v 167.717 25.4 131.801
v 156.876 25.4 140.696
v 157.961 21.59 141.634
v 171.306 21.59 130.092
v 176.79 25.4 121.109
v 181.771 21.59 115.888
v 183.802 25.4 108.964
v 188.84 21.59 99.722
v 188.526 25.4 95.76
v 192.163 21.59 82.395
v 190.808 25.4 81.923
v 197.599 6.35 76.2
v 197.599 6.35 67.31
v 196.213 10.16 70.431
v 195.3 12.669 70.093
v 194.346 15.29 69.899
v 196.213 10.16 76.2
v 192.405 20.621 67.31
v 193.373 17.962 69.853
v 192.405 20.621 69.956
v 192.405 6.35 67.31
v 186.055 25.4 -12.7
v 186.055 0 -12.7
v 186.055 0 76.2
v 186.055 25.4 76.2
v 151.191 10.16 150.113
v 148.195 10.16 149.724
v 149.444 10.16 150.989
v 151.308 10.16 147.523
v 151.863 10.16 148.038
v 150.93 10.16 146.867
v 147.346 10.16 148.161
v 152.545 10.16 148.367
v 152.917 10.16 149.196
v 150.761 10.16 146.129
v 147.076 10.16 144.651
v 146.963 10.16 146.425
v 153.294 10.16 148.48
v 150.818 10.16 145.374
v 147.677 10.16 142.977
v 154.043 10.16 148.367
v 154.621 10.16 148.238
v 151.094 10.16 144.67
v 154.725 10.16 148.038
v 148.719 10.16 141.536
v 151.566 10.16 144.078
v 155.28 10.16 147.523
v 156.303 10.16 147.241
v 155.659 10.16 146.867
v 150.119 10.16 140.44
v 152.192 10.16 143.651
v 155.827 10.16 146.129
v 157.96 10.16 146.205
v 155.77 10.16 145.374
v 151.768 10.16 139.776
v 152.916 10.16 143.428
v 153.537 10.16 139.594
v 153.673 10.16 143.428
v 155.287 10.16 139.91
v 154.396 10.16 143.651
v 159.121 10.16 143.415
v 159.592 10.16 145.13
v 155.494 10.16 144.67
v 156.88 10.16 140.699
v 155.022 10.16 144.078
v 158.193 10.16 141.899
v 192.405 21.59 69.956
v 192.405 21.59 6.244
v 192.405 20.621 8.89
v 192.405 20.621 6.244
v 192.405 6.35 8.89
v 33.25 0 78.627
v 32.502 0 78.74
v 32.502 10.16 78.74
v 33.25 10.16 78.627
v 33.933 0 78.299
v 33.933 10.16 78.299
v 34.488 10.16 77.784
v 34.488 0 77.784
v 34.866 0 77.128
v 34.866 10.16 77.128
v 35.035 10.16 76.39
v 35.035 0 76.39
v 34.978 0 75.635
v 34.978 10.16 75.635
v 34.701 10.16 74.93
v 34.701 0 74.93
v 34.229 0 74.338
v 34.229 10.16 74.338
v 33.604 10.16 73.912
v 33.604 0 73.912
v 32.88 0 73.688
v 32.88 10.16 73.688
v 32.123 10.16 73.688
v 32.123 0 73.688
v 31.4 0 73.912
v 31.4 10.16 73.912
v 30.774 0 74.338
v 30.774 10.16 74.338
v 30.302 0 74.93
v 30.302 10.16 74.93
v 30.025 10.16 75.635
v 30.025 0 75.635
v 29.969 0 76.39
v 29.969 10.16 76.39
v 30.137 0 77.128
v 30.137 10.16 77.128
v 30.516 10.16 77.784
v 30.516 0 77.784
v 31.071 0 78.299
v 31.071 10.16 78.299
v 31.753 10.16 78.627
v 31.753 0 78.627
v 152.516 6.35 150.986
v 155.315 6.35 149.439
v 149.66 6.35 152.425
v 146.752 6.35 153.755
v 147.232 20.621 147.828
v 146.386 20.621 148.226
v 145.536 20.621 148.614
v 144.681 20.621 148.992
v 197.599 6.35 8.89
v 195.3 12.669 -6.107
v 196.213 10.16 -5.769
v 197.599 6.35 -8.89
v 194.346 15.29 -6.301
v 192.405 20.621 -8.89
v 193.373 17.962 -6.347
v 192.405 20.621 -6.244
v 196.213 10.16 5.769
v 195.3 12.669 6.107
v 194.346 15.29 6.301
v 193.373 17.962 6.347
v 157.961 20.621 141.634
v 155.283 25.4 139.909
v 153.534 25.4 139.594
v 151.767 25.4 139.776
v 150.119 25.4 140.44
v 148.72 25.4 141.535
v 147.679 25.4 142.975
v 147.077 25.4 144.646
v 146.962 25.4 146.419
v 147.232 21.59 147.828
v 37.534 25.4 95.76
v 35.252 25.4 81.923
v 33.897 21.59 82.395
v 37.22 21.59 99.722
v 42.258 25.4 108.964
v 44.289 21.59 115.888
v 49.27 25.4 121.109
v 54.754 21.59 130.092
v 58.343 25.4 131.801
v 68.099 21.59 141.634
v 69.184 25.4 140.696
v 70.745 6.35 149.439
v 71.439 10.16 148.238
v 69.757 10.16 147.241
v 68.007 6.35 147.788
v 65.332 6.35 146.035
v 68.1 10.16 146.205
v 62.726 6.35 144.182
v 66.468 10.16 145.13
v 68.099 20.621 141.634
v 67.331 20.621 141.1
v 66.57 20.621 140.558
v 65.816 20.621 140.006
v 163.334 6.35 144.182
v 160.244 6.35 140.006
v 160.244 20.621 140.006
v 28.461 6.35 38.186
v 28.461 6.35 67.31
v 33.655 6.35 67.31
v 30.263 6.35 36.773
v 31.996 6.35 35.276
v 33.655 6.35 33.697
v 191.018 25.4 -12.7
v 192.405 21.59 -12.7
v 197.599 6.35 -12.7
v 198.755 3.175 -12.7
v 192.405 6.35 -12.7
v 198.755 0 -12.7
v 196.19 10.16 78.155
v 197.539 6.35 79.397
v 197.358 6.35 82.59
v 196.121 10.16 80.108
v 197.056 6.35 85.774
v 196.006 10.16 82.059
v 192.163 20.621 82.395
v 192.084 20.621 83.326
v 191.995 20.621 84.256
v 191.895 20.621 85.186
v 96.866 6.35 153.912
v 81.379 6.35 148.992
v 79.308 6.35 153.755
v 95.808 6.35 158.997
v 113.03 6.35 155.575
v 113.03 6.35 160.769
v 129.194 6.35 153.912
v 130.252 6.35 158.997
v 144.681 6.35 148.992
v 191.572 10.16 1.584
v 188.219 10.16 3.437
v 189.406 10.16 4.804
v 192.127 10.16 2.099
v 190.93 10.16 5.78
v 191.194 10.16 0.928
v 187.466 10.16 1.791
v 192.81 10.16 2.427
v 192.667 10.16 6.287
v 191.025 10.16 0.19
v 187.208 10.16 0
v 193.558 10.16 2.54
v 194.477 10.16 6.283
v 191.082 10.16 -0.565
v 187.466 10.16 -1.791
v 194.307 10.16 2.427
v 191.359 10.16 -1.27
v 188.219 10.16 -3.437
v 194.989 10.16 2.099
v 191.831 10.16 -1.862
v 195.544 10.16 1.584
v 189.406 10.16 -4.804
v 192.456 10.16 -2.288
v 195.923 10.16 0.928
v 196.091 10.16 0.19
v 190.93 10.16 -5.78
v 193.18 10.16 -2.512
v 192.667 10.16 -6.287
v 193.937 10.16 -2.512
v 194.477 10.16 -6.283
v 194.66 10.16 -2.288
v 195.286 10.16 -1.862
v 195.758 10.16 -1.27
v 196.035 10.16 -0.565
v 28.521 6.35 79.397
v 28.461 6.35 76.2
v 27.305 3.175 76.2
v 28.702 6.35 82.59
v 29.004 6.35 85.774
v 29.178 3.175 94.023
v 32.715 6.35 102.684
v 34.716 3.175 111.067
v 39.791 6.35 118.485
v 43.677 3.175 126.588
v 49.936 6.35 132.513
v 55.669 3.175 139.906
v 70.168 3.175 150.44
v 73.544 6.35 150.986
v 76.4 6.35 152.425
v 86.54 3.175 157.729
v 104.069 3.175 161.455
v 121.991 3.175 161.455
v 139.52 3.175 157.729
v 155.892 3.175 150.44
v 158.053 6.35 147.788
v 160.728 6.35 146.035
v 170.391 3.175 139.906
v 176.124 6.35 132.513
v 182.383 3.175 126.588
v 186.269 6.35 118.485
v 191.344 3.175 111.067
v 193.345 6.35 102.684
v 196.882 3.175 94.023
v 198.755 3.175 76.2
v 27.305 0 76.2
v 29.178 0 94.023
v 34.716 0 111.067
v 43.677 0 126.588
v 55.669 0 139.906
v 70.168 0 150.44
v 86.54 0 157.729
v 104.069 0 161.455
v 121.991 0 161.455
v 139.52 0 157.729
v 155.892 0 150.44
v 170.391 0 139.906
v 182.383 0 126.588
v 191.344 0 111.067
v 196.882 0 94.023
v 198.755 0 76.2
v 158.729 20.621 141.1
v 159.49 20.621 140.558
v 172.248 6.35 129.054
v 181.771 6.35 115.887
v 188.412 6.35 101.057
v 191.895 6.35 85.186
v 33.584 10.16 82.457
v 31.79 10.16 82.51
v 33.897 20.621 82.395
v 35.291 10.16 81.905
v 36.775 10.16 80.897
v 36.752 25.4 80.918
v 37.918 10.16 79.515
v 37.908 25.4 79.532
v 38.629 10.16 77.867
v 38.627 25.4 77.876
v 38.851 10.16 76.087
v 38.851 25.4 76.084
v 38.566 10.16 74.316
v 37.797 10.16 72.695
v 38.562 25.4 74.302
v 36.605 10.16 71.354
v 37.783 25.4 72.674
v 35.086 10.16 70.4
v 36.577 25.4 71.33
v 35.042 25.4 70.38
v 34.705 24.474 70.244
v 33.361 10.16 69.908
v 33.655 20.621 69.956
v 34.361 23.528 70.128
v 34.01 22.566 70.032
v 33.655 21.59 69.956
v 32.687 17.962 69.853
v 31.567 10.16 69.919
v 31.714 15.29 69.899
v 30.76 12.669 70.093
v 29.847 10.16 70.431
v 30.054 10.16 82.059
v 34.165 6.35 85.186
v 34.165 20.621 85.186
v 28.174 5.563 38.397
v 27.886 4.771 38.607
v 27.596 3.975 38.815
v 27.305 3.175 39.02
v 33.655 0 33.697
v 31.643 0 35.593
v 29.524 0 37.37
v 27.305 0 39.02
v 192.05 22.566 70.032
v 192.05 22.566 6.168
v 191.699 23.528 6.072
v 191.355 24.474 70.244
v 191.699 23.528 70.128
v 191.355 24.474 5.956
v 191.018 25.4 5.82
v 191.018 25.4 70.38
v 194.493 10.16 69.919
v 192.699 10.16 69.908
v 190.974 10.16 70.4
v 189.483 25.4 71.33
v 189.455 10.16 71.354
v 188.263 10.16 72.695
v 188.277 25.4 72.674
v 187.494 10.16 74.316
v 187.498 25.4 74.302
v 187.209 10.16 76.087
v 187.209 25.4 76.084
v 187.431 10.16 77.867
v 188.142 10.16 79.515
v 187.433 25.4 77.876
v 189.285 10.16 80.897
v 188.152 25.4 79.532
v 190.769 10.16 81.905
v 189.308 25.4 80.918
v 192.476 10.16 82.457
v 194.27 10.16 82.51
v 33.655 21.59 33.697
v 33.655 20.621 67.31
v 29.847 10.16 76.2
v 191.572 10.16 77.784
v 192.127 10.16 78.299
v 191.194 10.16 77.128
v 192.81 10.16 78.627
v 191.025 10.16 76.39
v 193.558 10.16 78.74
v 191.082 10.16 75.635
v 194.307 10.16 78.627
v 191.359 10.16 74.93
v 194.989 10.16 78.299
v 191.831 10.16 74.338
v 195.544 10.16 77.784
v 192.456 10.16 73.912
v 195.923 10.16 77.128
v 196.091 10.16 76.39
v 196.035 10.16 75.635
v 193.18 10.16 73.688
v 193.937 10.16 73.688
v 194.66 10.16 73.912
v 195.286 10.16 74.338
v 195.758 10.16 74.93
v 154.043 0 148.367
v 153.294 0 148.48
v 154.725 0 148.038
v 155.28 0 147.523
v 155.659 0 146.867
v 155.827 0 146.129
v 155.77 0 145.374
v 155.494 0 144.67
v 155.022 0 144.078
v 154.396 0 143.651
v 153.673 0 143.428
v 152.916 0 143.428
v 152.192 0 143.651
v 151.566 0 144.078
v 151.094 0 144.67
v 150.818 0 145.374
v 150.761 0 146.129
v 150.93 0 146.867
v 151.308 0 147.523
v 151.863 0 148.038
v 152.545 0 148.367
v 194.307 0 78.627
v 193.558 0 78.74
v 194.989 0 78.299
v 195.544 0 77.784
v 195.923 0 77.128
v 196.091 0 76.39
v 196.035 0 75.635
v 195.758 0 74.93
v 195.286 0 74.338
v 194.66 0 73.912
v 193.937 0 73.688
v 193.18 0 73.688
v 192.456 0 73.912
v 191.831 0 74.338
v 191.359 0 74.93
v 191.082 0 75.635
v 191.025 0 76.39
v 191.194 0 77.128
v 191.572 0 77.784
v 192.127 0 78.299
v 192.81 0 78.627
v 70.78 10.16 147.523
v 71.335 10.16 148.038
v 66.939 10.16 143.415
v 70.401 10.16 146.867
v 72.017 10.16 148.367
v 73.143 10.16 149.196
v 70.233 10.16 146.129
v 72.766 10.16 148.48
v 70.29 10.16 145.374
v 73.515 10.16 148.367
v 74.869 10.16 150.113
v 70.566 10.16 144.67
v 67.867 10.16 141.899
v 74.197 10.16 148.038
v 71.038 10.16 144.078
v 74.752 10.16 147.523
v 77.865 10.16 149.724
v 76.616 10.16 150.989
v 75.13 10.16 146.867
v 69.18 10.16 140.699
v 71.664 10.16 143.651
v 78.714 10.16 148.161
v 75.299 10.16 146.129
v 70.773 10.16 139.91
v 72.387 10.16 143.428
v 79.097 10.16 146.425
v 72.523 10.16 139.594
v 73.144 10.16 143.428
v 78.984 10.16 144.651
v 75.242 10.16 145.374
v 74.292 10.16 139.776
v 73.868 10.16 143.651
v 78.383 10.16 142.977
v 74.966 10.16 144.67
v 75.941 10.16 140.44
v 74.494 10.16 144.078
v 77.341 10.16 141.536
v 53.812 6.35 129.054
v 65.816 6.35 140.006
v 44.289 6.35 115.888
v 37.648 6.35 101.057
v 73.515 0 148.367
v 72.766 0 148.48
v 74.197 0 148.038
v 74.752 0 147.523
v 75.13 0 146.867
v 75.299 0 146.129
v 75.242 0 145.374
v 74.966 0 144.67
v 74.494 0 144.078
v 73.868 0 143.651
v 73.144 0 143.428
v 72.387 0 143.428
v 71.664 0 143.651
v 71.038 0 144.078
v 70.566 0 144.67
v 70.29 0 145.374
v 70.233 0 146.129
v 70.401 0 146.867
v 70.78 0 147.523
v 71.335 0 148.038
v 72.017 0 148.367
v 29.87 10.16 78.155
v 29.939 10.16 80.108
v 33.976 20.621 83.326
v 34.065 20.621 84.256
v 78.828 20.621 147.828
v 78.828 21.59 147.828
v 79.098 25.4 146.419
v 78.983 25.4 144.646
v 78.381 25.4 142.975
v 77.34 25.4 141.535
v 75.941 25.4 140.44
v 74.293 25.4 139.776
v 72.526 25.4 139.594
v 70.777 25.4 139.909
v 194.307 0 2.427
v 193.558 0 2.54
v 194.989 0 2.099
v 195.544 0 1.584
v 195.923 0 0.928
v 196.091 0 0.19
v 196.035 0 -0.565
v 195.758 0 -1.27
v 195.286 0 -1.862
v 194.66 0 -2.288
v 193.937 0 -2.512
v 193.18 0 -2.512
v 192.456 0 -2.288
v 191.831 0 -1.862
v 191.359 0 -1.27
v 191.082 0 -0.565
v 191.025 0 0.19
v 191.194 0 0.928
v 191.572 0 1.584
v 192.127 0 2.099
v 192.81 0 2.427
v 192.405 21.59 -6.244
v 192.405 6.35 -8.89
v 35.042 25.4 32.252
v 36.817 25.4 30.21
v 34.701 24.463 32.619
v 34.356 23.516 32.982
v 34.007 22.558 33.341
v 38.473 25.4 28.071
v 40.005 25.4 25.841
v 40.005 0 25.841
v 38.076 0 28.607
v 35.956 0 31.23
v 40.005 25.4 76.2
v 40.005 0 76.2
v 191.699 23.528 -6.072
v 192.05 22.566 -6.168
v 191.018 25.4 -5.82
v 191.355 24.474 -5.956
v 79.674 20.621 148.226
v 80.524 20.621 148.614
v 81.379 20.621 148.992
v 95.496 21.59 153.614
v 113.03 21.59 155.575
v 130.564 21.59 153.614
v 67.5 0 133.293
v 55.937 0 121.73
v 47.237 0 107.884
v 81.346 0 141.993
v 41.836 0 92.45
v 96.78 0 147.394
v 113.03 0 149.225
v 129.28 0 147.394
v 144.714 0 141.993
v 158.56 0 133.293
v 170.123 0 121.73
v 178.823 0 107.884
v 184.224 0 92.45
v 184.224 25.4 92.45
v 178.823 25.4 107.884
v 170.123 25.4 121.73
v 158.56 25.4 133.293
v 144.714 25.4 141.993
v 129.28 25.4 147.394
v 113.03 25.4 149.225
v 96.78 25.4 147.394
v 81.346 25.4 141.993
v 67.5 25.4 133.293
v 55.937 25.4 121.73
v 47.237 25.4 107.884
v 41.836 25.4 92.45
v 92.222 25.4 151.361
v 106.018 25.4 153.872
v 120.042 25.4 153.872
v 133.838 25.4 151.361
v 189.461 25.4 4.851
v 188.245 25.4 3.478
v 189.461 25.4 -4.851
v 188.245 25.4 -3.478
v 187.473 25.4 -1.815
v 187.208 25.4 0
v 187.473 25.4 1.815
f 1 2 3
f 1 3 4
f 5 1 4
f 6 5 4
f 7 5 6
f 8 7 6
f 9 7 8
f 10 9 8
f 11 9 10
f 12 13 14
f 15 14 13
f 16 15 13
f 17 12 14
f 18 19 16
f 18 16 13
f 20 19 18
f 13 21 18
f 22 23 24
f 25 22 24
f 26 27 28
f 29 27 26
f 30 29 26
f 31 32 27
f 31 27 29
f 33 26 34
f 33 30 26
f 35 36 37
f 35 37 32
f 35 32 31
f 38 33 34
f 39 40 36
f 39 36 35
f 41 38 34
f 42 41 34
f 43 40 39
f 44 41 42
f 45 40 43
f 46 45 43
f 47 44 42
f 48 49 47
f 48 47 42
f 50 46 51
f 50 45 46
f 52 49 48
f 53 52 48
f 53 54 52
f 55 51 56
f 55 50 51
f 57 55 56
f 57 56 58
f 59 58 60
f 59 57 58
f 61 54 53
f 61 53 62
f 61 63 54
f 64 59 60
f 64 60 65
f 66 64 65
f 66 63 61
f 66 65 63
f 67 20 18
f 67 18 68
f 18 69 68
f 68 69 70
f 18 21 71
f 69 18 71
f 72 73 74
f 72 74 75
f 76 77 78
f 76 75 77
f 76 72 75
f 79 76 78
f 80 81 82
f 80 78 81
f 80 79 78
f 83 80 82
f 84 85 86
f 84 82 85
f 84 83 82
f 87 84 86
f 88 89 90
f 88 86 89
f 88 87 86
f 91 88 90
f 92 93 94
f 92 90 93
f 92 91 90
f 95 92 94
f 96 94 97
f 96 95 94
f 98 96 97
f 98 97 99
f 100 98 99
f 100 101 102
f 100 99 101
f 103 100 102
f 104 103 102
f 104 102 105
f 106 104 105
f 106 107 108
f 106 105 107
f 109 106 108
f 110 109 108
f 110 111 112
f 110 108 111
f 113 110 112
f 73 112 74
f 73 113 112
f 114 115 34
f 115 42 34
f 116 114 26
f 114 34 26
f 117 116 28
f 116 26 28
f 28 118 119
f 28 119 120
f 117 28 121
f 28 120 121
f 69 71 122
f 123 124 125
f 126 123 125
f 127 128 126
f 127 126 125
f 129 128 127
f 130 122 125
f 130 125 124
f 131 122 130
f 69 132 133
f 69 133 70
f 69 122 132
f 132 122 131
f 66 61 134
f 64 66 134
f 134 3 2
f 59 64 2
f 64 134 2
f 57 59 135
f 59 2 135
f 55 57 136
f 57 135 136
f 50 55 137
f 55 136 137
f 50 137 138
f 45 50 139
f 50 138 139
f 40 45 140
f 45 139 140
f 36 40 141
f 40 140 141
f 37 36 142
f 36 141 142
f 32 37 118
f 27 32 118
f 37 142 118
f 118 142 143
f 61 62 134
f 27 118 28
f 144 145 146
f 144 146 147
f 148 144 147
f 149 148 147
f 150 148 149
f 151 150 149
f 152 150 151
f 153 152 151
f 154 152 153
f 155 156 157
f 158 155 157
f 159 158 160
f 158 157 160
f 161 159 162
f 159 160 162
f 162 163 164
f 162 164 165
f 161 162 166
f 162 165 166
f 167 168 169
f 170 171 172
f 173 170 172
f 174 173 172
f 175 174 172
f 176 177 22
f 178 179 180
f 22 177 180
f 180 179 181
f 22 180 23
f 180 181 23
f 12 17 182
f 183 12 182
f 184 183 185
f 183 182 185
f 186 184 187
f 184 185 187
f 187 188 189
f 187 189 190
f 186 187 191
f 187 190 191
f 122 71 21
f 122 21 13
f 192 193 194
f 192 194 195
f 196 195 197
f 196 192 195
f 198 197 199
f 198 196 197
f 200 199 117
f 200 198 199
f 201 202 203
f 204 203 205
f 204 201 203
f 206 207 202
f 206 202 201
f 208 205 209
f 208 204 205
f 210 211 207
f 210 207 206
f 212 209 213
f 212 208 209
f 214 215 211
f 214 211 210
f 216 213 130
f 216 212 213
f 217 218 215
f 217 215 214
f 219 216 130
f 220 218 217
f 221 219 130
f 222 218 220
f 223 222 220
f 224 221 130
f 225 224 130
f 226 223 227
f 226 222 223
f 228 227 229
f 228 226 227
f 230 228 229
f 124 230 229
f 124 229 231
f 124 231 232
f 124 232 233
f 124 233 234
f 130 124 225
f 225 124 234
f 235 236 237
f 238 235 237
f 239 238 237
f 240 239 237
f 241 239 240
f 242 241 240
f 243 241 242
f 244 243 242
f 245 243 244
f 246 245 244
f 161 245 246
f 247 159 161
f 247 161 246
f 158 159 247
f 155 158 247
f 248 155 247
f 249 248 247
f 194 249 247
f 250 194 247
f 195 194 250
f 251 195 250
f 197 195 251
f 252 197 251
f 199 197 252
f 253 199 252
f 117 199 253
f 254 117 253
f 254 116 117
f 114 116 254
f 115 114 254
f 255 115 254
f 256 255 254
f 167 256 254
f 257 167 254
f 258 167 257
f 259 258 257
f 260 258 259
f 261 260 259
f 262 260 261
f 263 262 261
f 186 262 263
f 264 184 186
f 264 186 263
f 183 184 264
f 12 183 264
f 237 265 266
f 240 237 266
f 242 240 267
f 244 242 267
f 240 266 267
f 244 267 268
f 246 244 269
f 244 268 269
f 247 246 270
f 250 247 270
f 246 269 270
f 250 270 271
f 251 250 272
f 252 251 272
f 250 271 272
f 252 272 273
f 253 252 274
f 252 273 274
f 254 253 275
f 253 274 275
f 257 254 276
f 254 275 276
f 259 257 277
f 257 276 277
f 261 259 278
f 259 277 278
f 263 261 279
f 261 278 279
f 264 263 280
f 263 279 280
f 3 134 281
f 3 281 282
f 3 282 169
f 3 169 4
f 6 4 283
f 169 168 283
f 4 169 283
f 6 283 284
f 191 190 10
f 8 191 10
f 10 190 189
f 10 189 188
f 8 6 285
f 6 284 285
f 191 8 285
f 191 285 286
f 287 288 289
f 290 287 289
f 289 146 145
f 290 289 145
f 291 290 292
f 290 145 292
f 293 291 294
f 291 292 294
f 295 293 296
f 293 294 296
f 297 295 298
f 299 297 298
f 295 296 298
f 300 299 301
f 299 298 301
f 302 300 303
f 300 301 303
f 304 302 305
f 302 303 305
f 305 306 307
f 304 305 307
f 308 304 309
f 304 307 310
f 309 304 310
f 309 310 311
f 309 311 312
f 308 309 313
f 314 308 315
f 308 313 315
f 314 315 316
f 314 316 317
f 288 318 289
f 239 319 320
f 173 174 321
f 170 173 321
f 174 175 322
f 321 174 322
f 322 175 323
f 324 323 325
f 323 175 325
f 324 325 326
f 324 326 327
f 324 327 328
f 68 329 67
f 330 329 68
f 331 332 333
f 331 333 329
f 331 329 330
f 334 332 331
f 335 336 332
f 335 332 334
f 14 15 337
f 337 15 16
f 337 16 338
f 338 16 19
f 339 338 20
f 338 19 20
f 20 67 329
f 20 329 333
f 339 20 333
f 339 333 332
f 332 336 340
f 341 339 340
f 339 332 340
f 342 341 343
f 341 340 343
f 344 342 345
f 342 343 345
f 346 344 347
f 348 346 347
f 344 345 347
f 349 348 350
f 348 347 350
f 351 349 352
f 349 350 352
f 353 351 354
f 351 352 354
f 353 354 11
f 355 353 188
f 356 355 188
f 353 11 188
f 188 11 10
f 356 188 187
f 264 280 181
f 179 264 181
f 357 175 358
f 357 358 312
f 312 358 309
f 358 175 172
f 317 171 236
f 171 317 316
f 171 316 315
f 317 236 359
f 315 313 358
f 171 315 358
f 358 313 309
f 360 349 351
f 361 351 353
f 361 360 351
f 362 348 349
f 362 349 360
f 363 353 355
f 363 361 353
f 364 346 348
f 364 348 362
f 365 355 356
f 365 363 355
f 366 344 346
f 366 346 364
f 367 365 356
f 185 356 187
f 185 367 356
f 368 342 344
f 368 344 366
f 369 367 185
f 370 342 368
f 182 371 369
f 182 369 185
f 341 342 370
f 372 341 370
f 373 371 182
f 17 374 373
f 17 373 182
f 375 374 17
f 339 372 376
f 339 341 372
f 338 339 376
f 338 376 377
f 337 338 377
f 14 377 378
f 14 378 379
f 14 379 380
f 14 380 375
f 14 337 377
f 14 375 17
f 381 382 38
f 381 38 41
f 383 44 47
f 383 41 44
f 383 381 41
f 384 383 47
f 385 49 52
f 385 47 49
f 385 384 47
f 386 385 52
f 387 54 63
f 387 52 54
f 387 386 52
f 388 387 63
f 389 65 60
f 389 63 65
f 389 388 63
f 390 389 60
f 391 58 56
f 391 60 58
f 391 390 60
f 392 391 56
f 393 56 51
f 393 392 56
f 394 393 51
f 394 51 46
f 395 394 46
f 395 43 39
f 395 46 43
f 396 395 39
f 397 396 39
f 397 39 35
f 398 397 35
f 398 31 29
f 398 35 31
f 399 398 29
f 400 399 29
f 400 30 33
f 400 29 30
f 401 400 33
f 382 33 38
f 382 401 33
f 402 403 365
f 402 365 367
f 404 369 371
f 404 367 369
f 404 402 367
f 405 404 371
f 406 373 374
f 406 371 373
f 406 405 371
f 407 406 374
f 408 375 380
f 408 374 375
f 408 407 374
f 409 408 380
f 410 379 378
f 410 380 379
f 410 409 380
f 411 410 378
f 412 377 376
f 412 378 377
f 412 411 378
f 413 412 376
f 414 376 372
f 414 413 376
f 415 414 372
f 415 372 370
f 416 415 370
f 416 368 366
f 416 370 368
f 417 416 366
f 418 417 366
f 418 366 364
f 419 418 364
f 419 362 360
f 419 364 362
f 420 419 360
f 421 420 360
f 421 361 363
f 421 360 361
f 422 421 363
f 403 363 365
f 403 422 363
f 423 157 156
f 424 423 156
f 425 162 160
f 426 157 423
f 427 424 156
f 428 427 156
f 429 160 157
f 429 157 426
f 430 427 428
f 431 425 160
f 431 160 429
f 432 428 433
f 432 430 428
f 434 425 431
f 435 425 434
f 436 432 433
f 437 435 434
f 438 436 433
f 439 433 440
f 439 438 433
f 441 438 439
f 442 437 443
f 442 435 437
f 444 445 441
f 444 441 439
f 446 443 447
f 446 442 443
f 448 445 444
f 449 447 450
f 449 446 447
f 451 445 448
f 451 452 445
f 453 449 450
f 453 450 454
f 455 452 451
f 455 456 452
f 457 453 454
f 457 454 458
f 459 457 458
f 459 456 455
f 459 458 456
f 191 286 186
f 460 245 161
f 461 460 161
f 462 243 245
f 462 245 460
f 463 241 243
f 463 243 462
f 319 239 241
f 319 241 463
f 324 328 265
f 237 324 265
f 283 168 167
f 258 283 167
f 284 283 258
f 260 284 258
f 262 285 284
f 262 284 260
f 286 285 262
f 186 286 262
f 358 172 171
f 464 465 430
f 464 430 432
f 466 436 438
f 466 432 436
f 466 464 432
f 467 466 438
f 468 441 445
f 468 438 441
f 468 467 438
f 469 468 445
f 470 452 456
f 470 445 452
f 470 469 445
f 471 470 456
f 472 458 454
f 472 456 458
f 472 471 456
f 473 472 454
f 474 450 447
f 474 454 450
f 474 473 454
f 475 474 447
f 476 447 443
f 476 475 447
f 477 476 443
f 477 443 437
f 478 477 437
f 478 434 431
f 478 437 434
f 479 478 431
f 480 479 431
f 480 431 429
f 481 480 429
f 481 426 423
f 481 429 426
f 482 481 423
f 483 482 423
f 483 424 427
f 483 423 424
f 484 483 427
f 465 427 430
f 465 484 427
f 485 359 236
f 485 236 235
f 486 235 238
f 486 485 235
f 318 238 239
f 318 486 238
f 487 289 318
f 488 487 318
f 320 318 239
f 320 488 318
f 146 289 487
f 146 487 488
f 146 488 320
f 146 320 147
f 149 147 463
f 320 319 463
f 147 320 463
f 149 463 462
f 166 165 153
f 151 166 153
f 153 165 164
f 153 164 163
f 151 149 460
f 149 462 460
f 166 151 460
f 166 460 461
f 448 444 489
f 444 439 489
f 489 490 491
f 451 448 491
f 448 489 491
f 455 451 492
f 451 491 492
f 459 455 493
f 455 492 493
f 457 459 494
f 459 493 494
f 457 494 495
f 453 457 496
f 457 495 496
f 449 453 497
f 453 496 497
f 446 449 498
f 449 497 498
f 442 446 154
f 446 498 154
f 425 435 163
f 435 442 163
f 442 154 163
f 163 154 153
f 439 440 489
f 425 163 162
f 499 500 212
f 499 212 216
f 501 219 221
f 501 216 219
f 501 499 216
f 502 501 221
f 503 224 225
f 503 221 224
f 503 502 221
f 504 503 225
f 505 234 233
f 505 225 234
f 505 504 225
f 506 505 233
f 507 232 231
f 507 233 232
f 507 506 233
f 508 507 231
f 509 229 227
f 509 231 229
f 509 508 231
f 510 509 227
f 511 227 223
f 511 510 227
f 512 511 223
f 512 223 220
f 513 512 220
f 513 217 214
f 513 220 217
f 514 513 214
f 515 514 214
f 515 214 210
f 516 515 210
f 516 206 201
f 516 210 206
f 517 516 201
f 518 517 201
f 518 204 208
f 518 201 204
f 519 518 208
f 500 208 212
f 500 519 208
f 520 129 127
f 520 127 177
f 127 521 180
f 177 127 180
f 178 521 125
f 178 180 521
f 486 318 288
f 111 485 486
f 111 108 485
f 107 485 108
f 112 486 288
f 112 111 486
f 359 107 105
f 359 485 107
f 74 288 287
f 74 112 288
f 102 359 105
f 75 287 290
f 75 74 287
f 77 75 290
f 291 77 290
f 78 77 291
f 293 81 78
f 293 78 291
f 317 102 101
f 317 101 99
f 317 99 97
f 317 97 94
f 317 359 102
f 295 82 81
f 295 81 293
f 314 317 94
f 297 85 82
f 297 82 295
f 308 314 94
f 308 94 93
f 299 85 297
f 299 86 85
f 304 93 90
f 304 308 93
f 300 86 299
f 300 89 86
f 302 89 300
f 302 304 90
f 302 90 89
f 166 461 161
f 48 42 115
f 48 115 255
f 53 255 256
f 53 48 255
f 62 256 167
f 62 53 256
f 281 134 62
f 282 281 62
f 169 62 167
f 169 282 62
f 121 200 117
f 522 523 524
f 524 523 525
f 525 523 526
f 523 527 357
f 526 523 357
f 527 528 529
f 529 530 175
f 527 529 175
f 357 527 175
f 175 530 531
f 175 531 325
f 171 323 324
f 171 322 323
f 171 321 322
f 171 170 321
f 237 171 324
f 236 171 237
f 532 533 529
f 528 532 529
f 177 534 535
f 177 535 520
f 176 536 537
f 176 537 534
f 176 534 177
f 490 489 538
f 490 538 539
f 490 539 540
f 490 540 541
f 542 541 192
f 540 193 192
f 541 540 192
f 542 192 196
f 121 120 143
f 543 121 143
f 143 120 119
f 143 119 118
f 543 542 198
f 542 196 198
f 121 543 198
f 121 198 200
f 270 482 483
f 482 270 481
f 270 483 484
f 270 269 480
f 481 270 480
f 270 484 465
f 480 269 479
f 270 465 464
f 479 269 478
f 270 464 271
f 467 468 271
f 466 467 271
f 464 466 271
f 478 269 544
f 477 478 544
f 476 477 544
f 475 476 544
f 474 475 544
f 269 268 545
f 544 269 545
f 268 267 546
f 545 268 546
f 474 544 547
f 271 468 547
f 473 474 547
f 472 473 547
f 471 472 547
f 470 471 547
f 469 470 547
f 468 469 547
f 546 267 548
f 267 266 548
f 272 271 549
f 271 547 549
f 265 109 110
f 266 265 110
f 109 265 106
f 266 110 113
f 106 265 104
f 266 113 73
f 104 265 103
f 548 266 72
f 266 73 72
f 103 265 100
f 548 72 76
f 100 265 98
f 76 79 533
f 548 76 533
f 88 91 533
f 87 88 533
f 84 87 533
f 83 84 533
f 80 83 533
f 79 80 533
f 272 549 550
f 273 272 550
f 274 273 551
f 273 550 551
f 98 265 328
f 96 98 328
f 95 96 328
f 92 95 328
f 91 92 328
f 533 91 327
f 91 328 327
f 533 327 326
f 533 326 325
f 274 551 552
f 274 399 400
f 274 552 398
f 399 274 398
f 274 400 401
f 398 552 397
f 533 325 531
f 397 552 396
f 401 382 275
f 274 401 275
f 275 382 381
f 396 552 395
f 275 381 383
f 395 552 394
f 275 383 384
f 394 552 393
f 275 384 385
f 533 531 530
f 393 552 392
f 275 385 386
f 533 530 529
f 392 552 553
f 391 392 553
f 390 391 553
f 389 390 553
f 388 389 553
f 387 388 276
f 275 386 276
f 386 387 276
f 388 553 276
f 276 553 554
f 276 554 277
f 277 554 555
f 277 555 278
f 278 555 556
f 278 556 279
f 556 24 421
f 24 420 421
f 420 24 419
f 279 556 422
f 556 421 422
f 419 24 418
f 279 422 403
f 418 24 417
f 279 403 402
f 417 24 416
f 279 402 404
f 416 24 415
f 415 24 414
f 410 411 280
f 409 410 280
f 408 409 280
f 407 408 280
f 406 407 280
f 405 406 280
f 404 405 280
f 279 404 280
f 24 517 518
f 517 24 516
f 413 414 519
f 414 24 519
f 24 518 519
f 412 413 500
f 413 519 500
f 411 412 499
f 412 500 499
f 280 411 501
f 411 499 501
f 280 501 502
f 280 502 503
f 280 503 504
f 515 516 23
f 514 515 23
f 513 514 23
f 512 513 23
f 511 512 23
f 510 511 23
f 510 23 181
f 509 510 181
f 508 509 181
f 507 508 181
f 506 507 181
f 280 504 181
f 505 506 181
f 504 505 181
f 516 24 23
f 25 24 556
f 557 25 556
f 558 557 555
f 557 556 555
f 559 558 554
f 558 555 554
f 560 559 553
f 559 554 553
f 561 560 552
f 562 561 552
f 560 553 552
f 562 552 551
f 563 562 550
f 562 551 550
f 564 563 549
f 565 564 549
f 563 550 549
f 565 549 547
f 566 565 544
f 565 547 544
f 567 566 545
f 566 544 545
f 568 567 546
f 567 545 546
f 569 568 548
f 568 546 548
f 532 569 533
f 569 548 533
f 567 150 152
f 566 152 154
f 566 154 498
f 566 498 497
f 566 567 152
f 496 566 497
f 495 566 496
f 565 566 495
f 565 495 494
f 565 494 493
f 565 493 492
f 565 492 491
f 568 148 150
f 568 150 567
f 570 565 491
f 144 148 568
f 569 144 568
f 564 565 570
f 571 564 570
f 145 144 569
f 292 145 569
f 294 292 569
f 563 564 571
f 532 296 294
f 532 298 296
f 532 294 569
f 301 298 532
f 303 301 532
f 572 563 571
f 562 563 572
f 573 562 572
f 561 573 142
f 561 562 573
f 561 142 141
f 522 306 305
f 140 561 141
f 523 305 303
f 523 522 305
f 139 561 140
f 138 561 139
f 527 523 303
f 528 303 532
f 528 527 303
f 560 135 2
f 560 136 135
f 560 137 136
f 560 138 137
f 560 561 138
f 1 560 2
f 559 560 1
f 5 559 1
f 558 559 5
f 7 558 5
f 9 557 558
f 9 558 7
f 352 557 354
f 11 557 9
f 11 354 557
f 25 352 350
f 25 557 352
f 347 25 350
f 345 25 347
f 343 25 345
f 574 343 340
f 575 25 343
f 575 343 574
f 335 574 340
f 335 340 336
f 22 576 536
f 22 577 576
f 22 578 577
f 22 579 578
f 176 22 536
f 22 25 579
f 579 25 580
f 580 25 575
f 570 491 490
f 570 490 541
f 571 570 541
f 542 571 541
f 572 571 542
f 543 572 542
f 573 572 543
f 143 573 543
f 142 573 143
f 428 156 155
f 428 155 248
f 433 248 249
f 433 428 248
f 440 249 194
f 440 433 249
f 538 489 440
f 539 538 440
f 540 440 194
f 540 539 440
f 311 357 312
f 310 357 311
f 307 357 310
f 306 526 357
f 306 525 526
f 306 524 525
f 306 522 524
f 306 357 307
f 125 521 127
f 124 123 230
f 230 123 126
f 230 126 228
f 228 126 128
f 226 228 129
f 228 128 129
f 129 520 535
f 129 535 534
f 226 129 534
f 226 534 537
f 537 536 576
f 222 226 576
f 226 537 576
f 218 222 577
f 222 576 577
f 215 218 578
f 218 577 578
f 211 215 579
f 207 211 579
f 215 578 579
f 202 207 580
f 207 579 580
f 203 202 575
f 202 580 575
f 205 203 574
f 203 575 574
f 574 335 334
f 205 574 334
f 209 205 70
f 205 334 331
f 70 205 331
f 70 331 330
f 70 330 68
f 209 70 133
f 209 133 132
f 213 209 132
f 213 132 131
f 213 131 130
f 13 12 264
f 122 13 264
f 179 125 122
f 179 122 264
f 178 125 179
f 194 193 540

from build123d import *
from OCP.BRepFilletAPI import BRepFilletAPI_MakeChamfer

# Parameters (mm, degrees)
BOSS_EXTRUDE1_DEPTH     = 25.4
BOSS_EXTRUDE2_DEPTH     = 6.35
CHAMFER1_SIZE           = 3.175
CHAMFER1_SIZE2          = 1.155605494
BOSS_EXTRUDE3_DEPTH     = 8.89
REVOLVE1_ANGLE          = 6.5
CHAMFER2_SIZE           = 3.81
CHAMFER2_SIZE2          = 1.386726593
CIRPATTERN1_COUNT       = 3
CIRPATTERN1_ANGLE       = 120
LPATTERN1_COUNT         = 2
LPATTERN1_PITCH         = 76.2
CUT_EXTRUDE1_DEPTH      = 258.62068172
CUT_EXTRUDE1_DEPTH_BACK = 258.62068172
SKETCH8_R               = 2.54
SKETCH8_3_R             = 6.35
CUT_EXTRUDE2_DEPTH      = 15.24


with BuildPart() as part:
    # Sketch2 → Boss-Extrude1 (new body)
    with BuildSketch(Plane(origin=(0, 0, 0), x_dir=(1, 0, 0), z_dir=(0, 1, 0))):
        with BuildLine():
            Line((186.055, 0), (186.055, -76.2))
            ThreePointArc((186.055, -76.2), (113.03, -149.225), (40.005, -76.2))
            Line((40.005, -76.2), (40.005, -25.840677236))
            ThreePointArc((40.005, -25.840677236), (37.038884837, -29.937629082), (33.655, -33.69690787))
            Line((33.655, -33.69690787), (33.655, -76.2))
            ThreePointArc((33.655, -76.2), (113.03, -155.575), (192.405, -76.2))
            Line((192.405, -76.2), (192.405, 12.7))
            Line((192.405, 12.7), (186.055, 12.7))
            Line((186.055, 12.7), (186.055, 0))
        make_face()
    extrude(amount=BOSS_EXTRUDE1_DEPTH)

    # Sketch2<3> → Boss-Extrude2 (add)
    with BuildSketch(Plane(origin=(0, 0, 0), x_dir=(1, 0, 0), z_dir=(0, 1, 0))):
        with BuildLine():
            Line((198.755, 12.7), (192.405, 12.7))
            Line((192.405, 12.7), (192.405, -76.2))
            ThreePointArc((192.405, -76.2), (113.03, -155.575), (33.655, -76.2))
            Line((33.655, -76.2), (33.655, -33.69690787))
            ThreePointArc((33.655, -33.69690787), (30.595993432, -36.496928788), (27.305, -39.020220399))
            Line((27.305, -39.020220399), (27.305, -76.2))
            ThreePointArc((27.305, -76.2), (113.03, -161.925), (198.755, -76.2))
            Line((198.755, -76.2), (198.755, 12.7))
        make_face()
    extrude(amount=BOSS_EXTRUDE2_DEPTH)

    # Chamfer1: one chamfer whose edges measure the first distance from different faces: ONE call of the kernel's chamfer builder (chamfer() names one face for all edges)
    chamfer1_edges_1 = [part.edges().sort_by_distance(p)[0] for p in [
        (27.305, 6.35, 57.6101102),
    ]]
    chamfer1_side_1 = [part.faces().sort_by_distance(p)[0] for p in [
        (27.305, 3.175, 57.6101102),
    ]]
    chamfer1_edges_2 = [part.edges().sort_by_distance(p)[0] for p in [
        (198.755, 6.35, 31.75),
    ]]
    chamfer1_side_2 = [part.faces().sort_by_distance(p)[0] for p in [
        (198.755, 3.175, 31.75),
    ]]
    chamfer1_edges_3 = [part.edges().sort_by_distance(p)[0] for p in [
        (113.03, 6.35, 161.925),
    ]]
    chamfer1_side_3 = [part.faces().sort_by_distance(p)[0] for p in [
        (113.03, 3.175, 161.925),
    ]]
    chamfer1 = BRepFilletAPI_MakeChamfer(part.part.solid().wrapped)
    for e in chamfer1_edges_1:
        chamfer1.Add(CHAMFER1_SIZE, CHAMFER1_SIZE2, e.wrapped, chamfer1_side_1[0].wrapped)  # the first distance lies on this face
    for e in chamfer1_edges_2:
        chamfer1.Add(CHAMFER1_SIZE, CHAMFER1_SIZE2, e.wrapped, chamfer1_side_2[0].wrapped)  # the first distance lies on this face
    for e in chamfer1_edges_3:
        chamfer1.Add(CHAMFER1_SIZE, CHAMFER1_SIZE2, e.wrapped, chamfer1_side_3[0].wrapped)  # the first distance lies on this face
    add(Compound.cast(chamfer1.Shape()), mode=Mode.REPLACE)

    # Chamfer2: one chamfer whose edges measure the first distance from different faces: ONE call of the kernel's chamfer builder (chamfer() names one face for all edges)
    chamfer2_edges_1 = [part.edges().sort_by_distance(p)[0] for p in [
        (33.655, 25.4, 54.948453935),
    ]]
    chamfer2_side_1 = [part.faces().sort_by_distance(p)[0] for p in [
        (33.655, 15.875, 54.948453935),
    ]]
    chamfer2_edges_2 = [part.edges().sort_by_distance(p)[0] for p in [
        (192.405, 25.4, 31.75),
    ]]
    chamfer2_side_2 = [part.faces().sort_by_distance(p)[0] for p in [
        (192.405, 15.875, 31.75),
    ]]
    chamfer2_edges_3 = [part.edges().sort_by_distance(p)[0] for p in [
        (113.03, 25.4, 155.575),
    ]]
    chamfer2_side_3 = [part.faces().sort_by_distance(p)[0] for p in [
        (113.03, 15.875, 155.575),
    ]]
    chamfer2 = BRepFilletAPI_MakeChamfer(part.part.solid().wrapped)
    for e in chamfer2_edges_1:
        chamfer2.Add(CHAMFER2_SIZE, CHAMFER2_SIZE2, e.wrapped, chamfer2_side_1[0].wrapped)  # the first distance lies on this face
    for e in chamfer2_edges_2:
        chamfer2.Add(CHAMFER2_SIZE, CHAMFER2_SIZE2, e.wrapped, chamfer2_side_2[0].wrapped)  # the first distance lies on this face
    for e in chamfer2_edges_3:
        chamfer2.Add(CHAMFER2_SIZE, CHAMFER2_SIZE2, e.wrapped, chamfer2_side_3[0].wrapped)  # the first distance lies on this face
    add(Compound.cast(chamfer2.Shape()), mode=Mode.REPLACE)


with BuildPart() as body_2:
    # Sketch4 → Boss-Extrude3 (new body)
    with BuildSketch(Plane.XY.offset(76.2)):
        Polygon((28.460605494, 6.35), (33.655, 20.621481614), (33.655, 6.35), align=None)
    extrude(amount=-BOSS_EXTRUDE3_DEPTH)


with BuildPart() as body_3:
    # Sketch4<4> → Revolve1 (revolve)
    with BuildSketch(Plane.XY.offset(76.2)):
        Polygon((28.460605494, 6.35), (33.655, 20.621481614), (33.655, 6.35), align=None)
    revolve(axis=Axis((113.03, 0, 76.2), (0, 1, 0)), revolution_arc=REVOLVE1_ANGLE)


with BuildPart() as body_4:
    # Mirror1: mirrored copy
    add(body_3.part.mirror(Plane.ZY.offset(-113.03)))


with BuildPart() as body_5:
    # Mirror1 2: mirrored copy
    add(body_2.part.mirror(Plane.ZY.offset(-113.03)))


with BuildPart() as cirpattern1_1:
    # CirPattern1: pattern copy
    add(body_3.part.rotate(Axis((113.03, 0, 76.2), (0, 1, 0)), 1 * CIRPATTERN1_ANGLE / (CIRPATTERN1_COUNT - 1)))


with BuildPart() as cirpattern1_2:
    # CirPattern1: pattern copy
    add(body_3.part.rotate(Axis((113.03, 0, 76.2), (0, 1, 0)), 2 * CIRPATTERN1_ANGLE / (CIRPATTERN1_COUNT - 1)))


with BuildPart() as body_8:
    # Mirror2: mirrored copy
    add(cirpattern1_1.part.mirror(Plane(origin=(56.515, 0, 174.08685139), x_dir=(-0.499999999999998, 0, 0.8660254037844398), z_dir=(0.8660254037844398, 0, 0.499999999999998))))


with BuildPart() as body_9:
    # Mirror3: mirrored copy
    add(cirpattern1_2.part.mirror(Plane(origin=(169.545, 0, 174.08685139), x_dir=(0.5000000000000039, 0, 0.8660254037844363), z_dir=(0.8660254037844363, 0, -0.500000000000004))))


with BuildPart() as lpattern1_1:
    # LPattern1: pattern copy
    add(body_5.part.moved(Location(Vector(0, 0, -1) * (1 * LPATTERN1_PITCH))))


with BuildPart() as body_11:
    # Mirror4: mirrored copy
    add(lpattern1_1.part.mirror(Plane(origin=(226.06, 0, 0), x_dir=(1, 0, 0), z_dir=(0, 0, -1))))


with BuildPart() as body_4_1:
    add(body_4.part)

    # Combine2: union body 8, body 11, body 5, CirPattern1_1, CirPattern1_2, part, body 9, body 2, LPattern1_1, body 3
    add(body_8.part)
    add(body_11.part)
    add(body_5.part)
    add(cirpattern1_1.part)
    add(cirpattern1_2.part)
    add(part.part)
    add(body_9.part)
    add(body_2.part)
    add(lpattern1_1.part)
    add(body_3.part)

    # Sketch8 → Cut-Extrude1 (cut, two sides: drawn at the far end of the back side and taken through both)
    with BuildSketch(Plane(origin=(0, 25.4, 0), x_dir=(1, 0, 0), z_dir=(0, 1, 0)).offset(-CUT_EXTRUDE1_DEPTH_BACK)):
        with Locations((32.501726593, -76.2)):
            Circle(SKETCH8_R)
        with Locations((72.765863296, -145.939530494)):
            Circle(SKETCH8_R)
        with Locations((153.294136704, -145.939530494)):
            Circle(SKETCH8_R)
        with Locations((193.558273407, -76.2)):
            Circle(SKETCH8_R)
        with Locations((193.558273407, 0)):
            Circle(SKETCH8_R)
    extrude(amount=CUT_EXTRUDE1_DEPTH + CUT_EXTRUDE1_DEPTH_BACK, mode=Mode.SUBTRACT)

    # Sketch8<3> → Cut-Extrude2 (cut)
    with BuildSketch(Plane(origin=(0, 25.4, 0), x_dir=(1, 0, 0), z_dir=(0, 1, 0))):
        with Locations((32.501726593, -76.2)):
            Circle(SKETCH8_3_R)
        with Locations((72.765863296, -145.939530494)):
            Circle(SKETCH8_3_R)
        with Locations((153.294136704, -145.939530494)):
            Circle(SKETCH8_3_R)
        with Locations((193.558273407, -76.2)):
            Circle(SKETCH8_3_R)
        with Locations((193.558273407, 0)):
            Circle(SKETCH8_3_R)
    extrude(amount=-CUT_EXTRUDE2_DEPTH, mode=Mode.SUBTRACT)


solid = body_4_1.part
